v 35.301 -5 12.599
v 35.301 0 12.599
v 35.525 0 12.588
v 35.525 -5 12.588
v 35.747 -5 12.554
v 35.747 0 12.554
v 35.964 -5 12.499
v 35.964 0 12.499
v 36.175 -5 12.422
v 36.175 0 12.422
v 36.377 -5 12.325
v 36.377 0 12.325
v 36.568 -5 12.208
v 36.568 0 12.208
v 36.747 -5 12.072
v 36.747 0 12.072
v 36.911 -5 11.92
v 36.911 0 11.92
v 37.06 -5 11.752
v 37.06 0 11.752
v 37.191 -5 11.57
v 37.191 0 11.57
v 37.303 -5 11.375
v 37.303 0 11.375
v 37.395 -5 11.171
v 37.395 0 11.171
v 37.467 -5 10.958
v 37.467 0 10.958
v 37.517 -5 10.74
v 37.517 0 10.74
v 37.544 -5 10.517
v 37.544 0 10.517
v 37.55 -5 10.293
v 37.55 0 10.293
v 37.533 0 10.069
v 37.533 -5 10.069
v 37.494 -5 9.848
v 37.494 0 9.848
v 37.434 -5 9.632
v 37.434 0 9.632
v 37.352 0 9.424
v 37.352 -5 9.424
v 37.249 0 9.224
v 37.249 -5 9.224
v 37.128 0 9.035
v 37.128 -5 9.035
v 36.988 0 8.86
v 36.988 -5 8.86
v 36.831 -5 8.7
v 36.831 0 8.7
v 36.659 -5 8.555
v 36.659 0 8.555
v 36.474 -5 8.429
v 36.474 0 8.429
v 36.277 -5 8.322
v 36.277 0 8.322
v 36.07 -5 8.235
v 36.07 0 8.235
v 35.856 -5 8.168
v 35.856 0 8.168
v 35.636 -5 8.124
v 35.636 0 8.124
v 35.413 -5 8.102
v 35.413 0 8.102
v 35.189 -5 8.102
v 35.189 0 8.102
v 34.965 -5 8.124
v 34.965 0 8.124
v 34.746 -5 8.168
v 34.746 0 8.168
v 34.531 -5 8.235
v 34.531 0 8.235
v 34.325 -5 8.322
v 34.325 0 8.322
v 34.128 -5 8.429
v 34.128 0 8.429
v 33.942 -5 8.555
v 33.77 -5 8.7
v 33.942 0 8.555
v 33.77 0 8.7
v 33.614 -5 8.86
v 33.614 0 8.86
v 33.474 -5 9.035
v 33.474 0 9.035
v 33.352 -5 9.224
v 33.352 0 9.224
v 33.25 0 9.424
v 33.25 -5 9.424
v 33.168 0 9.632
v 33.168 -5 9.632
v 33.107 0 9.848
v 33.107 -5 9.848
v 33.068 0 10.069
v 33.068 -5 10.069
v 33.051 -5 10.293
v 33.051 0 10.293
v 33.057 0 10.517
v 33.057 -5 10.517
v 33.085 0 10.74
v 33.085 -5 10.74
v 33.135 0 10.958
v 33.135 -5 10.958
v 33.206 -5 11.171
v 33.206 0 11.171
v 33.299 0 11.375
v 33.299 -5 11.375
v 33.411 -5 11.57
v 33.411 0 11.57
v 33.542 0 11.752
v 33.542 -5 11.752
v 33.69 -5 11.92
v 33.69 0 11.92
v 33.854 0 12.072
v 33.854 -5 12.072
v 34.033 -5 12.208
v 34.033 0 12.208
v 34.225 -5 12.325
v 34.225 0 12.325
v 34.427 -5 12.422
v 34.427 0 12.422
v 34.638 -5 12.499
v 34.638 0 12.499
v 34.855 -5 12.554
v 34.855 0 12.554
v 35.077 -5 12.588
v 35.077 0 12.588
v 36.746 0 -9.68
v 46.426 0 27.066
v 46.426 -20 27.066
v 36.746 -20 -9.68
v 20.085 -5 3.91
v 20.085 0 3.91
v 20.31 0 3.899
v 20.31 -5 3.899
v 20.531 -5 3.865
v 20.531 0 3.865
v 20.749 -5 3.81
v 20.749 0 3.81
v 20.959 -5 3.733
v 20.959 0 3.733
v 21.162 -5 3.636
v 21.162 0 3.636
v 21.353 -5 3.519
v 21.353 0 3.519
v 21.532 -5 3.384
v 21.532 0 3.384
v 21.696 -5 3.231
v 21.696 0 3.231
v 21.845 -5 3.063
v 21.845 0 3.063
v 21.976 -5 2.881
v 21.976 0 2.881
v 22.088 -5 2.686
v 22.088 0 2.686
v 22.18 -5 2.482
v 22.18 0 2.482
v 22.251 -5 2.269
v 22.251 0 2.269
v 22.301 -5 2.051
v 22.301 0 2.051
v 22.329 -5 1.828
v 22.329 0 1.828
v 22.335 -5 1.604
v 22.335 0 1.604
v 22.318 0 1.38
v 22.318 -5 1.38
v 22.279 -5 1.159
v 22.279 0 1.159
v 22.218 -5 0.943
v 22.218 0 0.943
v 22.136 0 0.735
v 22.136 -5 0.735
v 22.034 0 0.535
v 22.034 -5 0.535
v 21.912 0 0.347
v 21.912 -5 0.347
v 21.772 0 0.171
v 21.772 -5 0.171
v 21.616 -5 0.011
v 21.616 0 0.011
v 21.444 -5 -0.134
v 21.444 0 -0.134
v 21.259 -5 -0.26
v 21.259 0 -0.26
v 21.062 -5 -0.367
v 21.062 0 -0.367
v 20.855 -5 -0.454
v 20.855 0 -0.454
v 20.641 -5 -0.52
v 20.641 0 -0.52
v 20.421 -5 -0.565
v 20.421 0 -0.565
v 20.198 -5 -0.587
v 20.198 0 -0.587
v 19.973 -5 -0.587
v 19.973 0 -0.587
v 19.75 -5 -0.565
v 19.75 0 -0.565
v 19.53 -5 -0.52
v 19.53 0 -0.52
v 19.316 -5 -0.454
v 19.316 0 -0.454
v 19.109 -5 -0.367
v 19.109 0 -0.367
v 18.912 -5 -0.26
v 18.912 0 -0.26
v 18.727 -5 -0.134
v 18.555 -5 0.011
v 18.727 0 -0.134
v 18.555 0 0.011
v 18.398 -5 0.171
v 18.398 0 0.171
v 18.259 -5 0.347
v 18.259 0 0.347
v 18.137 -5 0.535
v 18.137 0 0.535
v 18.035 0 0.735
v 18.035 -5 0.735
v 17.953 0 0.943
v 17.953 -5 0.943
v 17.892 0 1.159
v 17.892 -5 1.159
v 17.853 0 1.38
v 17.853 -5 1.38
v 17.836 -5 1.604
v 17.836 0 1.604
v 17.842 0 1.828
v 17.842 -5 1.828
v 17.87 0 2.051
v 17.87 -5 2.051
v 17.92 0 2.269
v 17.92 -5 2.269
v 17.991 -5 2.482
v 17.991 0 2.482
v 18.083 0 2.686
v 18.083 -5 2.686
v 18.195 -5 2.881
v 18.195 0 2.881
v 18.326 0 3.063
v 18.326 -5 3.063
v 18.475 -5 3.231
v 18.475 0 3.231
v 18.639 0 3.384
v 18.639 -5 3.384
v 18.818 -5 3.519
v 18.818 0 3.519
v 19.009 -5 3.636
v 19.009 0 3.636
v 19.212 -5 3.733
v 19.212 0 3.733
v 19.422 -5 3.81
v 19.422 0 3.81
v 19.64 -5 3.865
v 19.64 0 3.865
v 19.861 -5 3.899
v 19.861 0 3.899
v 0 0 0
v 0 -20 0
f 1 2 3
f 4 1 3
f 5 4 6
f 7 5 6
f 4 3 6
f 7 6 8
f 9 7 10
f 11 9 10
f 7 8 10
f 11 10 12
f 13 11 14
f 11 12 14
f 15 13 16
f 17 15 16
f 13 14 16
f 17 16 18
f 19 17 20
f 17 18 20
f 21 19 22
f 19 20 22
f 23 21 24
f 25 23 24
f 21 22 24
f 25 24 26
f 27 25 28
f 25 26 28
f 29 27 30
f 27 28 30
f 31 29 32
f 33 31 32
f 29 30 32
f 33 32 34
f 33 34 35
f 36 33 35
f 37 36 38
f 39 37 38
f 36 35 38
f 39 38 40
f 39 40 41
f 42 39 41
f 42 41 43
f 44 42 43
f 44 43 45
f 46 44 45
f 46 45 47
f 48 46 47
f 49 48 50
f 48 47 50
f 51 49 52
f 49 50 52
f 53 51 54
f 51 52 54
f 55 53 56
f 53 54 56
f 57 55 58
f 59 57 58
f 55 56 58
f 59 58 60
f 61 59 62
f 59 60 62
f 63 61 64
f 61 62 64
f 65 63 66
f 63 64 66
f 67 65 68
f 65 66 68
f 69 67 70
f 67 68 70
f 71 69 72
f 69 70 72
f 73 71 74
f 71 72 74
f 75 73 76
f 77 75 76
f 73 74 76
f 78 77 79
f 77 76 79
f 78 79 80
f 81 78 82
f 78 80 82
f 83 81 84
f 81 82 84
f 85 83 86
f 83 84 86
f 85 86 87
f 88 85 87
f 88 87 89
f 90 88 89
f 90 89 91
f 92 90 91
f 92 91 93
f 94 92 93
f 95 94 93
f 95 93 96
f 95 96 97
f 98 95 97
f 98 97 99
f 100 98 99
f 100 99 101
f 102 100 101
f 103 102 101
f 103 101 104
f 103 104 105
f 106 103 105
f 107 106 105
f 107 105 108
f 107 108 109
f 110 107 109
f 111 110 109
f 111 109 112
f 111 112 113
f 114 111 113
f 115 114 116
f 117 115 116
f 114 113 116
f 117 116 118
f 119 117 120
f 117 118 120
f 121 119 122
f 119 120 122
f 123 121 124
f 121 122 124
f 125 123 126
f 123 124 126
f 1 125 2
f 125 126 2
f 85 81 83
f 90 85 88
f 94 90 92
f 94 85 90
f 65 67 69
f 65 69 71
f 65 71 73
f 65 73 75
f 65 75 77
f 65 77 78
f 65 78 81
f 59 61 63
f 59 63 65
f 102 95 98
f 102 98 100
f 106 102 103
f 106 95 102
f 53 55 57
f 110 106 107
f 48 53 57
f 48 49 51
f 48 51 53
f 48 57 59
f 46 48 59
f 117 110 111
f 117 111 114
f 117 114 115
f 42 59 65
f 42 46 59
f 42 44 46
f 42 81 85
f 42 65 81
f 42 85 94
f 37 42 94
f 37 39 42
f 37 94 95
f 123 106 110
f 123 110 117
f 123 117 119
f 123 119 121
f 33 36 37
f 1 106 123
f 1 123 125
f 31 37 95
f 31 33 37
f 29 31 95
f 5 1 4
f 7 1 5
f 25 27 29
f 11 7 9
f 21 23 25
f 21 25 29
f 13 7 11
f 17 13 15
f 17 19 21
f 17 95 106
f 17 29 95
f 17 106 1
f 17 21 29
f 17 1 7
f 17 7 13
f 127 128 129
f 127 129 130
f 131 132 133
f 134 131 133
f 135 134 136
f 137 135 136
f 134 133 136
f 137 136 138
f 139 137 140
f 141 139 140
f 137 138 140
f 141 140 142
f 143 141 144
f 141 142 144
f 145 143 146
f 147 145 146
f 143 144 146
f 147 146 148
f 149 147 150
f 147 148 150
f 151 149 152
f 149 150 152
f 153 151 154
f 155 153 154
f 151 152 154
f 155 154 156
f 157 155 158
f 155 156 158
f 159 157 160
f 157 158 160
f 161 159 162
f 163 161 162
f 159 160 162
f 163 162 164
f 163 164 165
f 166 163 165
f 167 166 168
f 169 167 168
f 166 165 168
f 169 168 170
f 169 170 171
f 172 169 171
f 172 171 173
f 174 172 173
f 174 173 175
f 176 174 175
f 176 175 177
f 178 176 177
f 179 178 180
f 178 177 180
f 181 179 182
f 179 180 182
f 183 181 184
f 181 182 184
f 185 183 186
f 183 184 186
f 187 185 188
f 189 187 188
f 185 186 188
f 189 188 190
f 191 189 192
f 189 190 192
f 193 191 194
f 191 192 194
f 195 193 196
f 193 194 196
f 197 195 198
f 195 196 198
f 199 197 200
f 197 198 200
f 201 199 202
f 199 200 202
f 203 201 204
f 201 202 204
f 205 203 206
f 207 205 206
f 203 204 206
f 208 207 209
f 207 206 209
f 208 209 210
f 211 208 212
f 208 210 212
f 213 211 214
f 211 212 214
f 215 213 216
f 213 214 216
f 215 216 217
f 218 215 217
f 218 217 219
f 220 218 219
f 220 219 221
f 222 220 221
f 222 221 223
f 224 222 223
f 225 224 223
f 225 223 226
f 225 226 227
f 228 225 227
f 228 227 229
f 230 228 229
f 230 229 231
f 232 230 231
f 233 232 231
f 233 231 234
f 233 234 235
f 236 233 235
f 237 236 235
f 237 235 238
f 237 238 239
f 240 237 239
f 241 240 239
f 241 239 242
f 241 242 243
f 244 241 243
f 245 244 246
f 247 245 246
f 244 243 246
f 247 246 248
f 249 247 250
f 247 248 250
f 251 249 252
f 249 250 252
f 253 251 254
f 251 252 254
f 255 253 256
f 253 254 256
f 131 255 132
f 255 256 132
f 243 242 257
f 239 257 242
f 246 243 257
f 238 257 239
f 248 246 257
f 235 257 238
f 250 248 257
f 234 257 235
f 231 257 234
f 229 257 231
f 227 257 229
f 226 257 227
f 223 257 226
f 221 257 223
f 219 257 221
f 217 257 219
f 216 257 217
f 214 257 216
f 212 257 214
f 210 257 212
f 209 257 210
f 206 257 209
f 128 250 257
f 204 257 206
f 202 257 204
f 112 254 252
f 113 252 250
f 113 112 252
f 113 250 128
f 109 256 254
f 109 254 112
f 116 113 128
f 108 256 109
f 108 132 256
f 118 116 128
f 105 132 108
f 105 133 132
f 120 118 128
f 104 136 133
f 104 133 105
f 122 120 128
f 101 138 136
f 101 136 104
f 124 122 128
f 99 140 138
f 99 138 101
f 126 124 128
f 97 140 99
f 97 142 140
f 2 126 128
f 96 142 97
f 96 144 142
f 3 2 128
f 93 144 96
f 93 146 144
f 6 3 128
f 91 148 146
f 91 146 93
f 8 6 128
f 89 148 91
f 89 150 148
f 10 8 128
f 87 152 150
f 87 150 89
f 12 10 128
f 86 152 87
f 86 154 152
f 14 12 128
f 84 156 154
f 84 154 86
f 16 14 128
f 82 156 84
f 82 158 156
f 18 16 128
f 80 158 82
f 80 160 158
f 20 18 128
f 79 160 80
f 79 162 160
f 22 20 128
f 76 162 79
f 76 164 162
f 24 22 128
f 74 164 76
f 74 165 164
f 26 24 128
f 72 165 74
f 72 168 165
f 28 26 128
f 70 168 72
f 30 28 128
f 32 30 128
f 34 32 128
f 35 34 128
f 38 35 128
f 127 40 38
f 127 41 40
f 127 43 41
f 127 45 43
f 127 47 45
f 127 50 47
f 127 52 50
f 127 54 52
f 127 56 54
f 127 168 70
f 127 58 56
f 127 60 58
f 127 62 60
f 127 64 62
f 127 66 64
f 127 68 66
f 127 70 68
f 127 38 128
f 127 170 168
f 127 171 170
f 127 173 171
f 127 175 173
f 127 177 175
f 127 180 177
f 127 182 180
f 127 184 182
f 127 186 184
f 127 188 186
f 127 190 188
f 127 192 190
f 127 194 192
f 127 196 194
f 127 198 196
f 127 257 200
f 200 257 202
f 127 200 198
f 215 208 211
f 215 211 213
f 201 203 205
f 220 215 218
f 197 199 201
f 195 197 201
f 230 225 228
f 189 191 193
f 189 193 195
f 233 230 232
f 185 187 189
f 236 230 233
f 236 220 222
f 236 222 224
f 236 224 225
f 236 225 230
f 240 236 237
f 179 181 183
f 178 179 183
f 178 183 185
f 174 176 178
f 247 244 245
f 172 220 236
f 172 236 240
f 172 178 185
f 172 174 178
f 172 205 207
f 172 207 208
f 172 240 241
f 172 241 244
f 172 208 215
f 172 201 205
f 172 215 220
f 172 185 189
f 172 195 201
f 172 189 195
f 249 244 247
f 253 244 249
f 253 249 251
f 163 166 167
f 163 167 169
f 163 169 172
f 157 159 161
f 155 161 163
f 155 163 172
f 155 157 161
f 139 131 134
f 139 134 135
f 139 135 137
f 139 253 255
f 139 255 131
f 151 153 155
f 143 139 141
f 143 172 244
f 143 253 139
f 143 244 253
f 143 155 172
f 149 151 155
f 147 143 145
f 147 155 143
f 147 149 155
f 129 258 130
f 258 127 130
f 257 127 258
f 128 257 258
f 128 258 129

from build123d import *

# Parameters (mm, degrees)
BOSS_EXTRUDE1_DEPTH = 20
SKETCH8_R           = 2.25
CUT_EXTRUDE3_DEPTH  = 5


with BuildPart() as part:
    # Sketch1 → Boss-Extrude1 (new body)
    with BuildSketch(Plane(origin=(0, 0, 0), x_dir=(1, 0, 0), z_dir=(0, 1, 0))):
        Polygon((0, 0), (46.42630295, -27.066325838), (36.746372501, 9.680088225), align=None)
    extrude(amount=-BOSS_EXTRUDE1_DEPTH)

    # Sketch8 → Cut-Extrude3 (cut)
    with BuildSketch(Plane(origin=(0, 0, 0), x_dir=(1, 0, 0), z_dir=(0, 1, 0))):
        with Locations(Location((20.085479714, -1.659955888, 0), (0, 0, 270))):
            Circle(SKETCH8_R)
        with Locations(Location((35.300766899, -10.348896383, 0), (0, 0, 270))):
            Circle(SKETCH8_R)
    extrude(amount=-CUT_EXTRUDE3_DEPTH, mode=Mode.SUBTRACT)


solid = part.part
